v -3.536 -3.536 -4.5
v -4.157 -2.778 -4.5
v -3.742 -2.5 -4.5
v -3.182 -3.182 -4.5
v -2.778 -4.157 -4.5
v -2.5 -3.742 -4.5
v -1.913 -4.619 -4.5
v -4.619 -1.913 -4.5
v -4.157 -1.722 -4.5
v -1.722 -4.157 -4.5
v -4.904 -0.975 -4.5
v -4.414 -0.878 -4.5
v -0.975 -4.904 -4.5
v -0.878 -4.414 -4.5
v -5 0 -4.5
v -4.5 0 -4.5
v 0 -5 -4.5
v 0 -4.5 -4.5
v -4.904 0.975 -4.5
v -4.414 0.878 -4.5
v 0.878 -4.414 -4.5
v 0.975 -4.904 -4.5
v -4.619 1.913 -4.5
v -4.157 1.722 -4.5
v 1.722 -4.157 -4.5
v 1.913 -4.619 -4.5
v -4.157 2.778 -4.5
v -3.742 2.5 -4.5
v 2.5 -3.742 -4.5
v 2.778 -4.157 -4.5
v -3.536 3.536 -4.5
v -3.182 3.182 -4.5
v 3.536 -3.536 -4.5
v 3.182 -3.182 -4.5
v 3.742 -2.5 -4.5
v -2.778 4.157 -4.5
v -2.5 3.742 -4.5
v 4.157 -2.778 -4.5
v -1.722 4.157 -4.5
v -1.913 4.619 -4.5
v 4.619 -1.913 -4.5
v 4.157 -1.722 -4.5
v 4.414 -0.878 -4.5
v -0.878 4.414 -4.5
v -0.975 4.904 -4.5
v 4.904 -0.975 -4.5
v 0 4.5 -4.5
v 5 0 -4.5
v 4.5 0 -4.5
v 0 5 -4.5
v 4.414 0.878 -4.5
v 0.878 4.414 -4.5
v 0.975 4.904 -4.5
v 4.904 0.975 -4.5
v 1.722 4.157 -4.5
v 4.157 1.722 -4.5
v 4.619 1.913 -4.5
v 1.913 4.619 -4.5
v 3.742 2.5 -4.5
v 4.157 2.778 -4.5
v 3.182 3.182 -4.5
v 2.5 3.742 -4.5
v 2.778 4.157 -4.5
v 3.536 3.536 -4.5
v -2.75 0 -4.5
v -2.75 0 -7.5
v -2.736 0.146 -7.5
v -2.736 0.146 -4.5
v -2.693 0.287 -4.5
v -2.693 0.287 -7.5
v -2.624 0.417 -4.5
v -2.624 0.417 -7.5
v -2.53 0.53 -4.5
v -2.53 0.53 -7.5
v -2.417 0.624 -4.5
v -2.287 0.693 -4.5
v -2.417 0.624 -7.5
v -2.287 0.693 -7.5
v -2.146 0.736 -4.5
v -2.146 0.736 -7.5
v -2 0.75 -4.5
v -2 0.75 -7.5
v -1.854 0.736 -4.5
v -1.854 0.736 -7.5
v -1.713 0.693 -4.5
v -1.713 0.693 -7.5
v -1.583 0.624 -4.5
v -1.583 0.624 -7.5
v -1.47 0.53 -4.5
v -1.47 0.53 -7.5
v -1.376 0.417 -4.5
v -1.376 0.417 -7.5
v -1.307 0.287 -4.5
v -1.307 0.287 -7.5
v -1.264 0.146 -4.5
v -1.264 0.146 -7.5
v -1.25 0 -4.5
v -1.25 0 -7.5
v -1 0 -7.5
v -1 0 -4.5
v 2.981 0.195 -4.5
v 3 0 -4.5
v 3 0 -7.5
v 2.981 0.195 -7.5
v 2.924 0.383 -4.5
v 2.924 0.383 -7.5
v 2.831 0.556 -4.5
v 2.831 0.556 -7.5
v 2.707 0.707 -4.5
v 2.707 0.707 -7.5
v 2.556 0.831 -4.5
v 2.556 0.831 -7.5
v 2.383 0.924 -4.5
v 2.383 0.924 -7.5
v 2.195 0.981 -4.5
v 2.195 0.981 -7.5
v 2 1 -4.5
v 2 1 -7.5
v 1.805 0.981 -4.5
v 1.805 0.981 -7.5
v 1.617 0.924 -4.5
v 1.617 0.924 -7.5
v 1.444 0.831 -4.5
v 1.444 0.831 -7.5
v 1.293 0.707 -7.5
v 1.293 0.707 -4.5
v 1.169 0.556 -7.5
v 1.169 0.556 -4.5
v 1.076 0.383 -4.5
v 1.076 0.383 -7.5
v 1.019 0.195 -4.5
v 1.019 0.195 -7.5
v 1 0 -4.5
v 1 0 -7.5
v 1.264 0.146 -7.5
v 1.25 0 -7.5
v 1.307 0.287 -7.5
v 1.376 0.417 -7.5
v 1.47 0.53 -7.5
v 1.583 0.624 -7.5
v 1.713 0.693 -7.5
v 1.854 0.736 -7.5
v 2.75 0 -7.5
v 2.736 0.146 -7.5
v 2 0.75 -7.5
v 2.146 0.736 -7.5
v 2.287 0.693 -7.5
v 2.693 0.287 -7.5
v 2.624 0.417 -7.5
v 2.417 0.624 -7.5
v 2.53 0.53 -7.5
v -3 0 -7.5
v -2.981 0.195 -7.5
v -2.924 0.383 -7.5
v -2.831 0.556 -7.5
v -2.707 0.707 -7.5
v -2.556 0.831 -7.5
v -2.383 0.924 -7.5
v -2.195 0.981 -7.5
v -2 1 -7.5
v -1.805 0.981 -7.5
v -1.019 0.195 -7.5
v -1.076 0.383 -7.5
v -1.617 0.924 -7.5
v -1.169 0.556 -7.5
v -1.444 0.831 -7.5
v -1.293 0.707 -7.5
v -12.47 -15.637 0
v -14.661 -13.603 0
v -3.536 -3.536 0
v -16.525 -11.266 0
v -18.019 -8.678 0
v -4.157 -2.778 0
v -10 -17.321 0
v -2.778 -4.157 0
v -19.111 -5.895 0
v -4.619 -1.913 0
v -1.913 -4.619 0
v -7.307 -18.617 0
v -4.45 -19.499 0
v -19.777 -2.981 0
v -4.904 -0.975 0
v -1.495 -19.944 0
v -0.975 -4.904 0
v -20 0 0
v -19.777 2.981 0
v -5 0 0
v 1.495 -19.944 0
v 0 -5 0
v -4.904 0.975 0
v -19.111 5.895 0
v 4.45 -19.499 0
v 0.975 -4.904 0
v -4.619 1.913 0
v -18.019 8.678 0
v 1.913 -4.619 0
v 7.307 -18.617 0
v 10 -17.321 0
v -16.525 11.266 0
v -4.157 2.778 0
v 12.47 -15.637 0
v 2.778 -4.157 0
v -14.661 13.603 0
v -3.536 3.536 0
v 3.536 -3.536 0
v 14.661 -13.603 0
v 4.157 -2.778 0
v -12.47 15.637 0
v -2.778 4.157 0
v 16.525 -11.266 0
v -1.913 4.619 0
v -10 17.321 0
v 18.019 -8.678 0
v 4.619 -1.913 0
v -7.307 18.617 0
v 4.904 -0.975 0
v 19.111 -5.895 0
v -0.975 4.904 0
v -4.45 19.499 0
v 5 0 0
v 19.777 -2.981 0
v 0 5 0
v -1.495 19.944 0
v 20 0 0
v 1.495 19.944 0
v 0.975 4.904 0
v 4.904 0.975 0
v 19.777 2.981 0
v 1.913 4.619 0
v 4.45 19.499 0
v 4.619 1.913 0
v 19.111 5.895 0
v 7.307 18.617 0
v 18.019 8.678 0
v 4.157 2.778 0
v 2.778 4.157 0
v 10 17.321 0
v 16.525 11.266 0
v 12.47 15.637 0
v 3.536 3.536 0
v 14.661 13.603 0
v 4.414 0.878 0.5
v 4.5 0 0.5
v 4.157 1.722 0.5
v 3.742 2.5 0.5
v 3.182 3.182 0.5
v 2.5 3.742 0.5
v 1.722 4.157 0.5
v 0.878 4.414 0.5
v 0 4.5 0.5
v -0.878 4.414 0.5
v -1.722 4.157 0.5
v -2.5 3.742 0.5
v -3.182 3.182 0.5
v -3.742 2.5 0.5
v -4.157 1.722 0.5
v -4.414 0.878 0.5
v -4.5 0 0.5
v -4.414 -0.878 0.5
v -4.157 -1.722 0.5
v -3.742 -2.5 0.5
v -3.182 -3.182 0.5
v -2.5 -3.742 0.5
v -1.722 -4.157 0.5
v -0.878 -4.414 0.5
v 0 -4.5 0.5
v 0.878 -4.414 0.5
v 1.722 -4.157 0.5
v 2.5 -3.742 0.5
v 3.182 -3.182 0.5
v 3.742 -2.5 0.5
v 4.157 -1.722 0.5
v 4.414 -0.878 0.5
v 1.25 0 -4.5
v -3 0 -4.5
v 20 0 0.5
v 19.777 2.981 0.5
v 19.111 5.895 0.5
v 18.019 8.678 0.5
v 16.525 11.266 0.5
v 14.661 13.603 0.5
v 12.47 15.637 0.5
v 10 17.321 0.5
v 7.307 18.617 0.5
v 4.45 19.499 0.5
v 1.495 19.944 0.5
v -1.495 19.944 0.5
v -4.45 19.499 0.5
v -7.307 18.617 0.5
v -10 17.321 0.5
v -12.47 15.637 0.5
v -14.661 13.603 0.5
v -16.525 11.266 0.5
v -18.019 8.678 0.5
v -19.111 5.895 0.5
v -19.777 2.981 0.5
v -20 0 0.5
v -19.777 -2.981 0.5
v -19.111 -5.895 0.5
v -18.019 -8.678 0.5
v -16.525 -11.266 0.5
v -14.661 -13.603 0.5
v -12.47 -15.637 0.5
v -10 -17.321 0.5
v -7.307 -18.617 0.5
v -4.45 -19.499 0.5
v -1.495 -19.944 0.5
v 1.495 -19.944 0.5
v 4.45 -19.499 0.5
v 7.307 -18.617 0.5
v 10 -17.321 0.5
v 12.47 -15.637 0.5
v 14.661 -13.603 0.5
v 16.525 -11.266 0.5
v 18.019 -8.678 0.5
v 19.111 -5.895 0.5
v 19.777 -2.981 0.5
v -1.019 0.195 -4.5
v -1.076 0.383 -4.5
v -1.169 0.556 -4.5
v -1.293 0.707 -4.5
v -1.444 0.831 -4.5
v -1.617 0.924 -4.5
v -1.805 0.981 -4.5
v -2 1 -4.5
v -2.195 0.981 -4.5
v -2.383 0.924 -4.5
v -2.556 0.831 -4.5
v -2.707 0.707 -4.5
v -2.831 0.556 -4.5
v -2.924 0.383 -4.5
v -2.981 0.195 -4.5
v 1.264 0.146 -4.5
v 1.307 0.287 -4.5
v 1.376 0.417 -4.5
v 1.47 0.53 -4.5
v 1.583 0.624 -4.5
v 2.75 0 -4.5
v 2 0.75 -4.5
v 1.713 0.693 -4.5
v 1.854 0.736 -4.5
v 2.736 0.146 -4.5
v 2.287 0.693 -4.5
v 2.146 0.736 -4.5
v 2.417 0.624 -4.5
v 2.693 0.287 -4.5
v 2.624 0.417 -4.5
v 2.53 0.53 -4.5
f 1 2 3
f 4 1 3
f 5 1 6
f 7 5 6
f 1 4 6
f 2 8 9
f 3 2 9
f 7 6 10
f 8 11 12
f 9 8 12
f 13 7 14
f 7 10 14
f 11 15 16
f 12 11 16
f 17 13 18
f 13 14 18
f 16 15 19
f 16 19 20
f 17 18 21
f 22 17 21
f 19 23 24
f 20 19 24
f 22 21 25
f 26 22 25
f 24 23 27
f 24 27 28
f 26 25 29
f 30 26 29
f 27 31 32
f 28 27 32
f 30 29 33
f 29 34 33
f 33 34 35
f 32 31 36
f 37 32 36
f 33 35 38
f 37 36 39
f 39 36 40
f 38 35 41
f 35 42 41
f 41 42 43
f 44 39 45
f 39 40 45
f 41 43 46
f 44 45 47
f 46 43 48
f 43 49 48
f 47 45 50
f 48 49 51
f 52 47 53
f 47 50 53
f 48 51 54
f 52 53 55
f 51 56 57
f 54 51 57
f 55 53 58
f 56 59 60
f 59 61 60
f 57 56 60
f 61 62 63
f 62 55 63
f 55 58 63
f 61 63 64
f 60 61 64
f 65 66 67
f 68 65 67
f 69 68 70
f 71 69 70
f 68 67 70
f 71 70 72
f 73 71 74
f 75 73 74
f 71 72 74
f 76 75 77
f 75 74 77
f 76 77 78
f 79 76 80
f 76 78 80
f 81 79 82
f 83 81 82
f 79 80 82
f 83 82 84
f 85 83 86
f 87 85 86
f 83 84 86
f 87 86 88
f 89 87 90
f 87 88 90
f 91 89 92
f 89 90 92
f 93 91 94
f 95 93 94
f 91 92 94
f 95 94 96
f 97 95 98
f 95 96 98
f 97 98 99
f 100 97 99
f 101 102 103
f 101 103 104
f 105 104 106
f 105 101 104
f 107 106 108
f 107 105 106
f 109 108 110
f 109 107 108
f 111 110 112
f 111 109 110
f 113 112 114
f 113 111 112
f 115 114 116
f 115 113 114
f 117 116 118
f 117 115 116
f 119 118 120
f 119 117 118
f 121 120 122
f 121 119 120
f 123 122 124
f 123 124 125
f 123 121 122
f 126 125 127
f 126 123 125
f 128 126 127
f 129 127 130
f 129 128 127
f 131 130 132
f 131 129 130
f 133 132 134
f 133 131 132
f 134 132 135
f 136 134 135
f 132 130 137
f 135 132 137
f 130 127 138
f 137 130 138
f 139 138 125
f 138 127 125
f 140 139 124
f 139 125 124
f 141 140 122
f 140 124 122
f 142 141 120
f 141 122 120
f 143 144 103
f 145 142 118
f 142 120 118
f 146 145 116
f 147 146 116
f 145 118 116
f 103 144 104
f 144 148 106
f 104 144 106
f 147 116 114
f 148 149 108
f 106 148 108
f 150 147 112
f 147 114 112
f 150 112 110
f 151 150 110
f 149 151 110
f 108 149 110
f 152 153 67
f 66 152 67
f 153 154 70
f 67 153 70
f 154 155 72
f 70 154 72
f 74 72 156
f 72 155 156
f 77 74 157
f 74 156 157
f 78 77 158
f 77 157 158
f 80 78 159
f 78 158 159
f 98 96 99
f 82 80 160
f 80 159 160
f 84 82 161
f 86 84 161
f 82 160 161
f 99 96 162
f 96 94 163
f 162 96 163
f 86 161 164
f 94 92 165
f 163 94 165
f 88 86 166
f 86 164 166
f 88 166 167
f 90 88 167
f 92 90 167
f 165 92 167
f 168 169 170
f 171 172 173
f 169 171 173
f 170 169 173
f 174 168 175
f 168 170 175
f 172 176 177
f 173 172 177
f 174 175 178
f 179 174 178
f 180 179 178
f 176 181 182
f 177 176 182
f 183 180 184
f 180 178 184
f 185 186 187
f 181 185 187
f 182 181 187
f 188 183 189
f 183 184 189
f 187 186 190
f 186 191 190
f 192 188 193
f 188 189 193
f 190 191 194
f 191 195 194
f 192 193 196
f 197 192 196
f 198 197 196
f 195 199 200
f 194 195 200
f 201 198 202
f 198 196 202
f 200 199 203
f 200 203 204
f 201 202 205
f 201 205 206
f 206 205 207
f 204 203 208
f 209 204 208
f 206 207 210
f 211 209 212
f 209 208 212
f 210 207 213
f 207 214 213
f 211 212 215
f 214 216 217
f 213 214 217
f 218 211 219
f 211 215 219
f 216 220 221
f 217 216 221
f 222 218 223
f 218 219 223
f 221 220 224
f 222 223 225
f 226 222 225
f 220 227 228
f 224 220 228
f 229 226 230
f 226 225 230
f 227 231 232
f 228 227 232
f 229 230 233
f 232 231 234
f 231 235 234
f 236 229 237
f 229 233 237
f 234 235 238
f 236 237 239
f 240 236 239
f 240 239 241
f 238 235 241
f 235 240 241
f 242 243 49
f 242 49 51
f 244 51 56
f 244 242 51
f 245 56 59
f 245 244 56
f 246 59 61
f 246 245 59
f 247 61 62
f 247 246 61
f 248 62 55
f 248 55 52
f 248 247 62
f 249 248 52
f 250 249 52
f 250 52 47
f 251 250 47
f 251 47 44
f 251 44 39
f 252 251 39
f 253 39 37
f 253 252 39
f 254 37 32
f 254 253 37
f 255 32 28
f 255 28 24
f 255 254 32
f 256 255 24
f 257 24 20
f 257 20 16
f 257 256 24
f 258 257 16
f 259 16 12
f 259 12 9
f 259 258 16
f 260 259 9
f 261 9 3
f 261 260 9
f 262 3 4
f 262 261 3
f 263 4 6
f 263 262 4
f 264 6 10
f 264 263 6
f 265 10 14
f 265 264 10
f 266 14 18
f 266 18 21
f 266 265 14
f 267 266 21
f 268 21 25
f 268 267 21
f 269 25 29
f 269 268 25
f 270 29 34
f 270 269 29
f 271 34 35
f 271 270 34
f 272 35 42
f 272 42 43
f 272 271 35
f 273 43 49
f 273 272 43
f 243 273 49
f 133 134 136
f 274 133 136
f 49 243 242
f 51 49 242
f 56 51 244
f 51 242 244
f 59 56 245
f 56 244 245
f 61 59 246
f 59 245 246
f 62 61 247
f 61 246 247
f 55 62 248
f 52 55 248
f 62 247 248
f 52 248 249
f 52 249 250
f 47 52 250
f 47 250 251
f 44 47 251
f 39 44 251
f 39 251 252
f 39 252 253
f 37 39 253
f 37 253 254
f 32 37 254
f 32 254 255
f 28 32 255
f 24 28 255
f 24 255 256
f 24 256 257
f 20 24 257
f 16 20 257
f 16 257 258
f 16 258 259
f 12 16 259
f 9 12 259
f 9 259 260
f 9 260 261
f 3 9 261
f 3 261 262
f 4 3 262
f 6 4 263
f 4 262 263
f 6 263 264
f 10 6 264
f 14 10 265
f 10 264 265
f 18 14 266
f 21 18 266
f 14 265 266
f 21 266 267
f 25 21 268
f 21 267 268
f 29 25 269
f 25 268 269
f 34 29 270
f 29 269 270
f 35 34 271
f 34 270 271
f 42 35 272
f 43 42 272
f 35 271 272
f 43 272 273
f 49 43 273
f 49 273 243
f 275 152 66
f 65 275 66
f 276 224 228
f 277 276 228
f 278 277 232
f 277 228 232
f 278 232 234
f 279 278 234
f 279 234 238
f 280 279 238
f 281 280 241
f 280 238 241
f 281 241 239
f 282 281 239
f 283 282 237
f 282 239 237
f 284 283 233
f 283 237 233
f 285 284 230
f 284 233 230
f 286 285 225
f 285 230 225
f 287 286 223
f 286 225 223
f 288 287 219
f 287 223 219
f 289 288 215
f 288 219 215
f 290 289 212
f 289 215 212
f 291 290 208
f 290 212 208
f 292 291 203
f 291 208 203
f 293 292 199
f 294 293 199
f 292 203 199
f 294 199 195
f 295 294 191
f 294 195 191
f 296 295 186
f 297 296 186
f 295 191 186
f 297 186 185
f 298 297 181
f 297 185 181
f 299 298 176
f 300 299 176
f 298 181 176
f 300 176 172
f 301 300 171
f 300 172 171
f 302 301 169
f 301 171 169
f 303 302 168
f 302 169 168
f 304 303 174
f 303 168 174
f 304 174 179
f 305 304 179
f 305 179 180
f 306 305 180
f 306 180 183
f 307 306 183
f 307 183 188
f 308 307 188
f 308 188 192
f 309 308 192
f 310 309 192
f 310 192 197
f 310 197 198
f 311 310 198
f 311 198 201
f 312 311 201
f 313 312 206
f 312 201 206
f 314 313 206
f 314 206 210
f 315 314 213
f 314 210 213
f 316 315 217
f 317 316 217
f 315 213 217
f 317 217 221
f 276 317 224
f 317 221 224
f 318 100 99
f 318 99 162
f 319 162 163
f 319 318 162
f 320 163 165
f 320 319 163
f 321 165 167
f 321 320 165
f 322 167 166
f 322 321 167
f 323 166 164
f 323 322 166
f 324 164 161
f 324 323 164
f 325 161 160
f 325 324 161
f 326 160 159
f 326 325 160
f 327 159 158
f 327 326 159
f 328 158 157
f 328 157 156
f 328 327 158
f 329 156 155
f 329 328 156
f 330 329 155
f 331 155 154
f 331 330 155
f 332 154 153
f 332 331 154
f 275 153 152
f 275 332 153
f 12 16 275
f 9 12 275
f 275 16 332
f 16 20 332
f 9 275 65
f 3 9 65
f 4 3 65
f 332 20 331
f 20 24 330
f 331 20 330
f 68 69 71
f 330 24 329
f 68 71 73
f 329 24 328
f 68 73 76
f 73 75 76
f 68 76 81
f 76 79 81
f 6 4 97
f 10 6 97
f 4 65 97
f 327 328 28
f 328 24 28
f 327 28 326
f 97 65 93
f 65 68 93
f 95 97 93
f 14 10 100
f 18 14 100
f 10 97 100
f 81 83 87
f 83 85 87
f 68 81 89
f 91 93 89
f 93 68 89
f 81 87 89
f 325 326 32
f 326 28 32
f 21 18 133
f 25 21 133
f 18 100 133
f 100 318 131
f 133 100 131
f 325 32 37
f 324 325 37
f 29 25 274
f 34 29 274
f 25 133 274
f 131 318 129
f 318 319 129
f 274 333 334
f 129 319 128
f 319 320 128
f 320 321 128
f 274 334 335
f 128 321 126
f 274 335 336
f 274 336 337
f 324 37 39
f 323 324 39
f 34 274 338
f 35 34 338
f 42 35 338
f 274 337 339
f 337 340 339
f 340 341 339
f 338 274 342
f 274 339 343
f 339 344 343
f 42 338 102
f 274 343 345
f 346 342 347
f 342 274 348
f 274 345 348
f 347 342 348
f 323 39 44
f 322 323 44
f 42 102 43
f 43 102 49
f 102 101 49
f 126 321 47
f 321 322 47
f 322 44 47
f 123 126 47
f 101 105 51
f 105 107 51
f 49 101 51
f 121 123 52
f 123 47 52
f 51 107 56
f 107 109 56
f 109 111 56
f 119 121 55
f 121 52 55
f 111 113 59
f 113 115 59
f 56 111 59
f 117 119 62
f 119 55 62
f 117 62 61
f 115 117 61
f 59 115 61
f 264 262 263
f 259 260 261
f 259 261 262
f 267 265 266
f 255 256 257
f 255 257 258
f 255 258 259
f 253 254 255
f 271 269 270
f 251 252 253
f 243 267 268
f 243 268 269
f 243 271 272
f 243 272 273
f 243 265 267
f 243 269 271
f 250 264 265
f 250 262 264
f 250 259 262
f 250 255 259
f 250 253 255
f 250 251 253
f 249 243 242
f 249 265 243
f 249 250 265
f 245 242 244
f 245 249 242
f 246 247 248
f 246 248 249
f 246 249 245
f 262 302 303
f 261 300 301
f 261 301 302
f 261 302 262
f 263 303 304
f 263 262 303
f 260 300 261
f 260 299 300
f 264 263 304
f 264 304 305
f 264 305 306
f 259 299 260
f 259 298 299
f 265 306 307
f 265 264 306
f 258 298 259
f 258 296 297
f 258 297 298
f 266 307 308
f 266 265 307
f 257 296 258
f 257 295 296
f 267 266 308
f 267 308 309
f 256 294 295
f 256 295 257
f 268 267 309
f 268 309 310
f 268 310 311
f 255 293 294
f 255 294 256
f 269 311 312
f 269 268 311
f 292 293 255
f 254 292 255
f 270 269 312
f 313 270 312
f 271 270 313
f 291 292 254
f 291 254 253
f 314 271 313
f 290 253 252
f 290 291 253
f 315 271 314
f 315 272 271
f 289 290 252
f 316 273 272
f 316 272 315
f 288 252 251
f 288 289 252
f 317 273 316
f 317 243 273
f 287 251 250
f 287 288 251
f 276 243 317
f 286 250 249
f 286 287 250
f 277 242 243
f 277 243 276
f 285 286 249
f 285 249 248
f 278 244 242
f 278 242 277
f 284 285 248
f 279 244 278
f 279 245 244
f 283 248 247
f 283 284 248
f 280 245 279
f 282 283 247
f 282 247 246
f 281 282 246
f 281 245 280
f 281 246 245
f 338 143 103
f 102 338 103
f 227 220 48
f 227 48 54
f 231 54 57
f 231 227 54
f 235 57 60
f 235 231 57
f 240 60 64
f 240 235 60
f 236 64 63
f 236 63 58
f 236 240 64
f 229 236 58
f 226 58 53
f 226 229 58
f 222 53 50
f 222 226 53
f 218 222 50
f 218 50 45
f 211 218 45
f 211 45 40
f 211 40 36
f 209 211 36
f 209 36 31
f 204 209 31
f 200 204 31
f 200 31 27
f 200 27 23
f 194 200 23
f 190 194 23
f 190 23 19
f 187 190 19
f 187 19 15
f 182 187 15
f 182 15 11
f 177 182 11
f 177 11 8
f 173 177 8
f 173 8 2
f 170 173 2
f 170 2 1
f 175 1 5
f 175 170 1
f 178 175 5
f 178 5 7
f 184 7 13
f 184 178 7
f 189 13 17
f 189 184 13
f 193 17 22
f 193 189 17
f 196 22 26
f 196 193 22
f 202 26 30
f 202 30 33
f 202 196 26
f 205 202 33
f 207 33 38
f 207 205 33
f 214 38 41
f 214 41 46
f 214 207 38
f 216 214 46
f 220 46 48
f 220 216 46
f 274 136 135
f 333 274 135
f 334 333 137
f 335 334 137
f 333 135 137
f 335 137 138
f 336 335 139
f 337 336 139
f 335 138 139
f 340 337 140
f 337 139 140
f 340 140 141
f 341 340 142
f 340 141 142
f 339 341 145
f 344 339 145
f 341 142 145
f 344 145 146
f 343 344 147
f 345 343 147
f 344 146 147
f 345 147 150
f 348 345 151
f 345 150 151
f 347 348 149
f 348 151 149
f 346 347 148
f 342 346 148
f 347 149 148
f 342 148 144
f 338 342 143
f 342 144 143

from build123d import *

# Parameters (mm, degrees)
F0_R      = 20
F1_DEPTH  = 0.5
F2_R      = 5
F3_DEPTH  = 5
F4_R      = 4.5
F5_DEPTH  = 25
F6_R      = 4.5
F7_DEPTH  = 5
F8_R      = 1
F9_DEPTH  = 8
F11_DEPTH = 3


with BuildPart() as f1:
    # F0 (on Top) → F1 (new body)
    with BuildSketch(Plane.XY):
        Circle(F0_R)
    extrude(amount=F1_DEPTH)

    # F2 (on face) → F3 (join)
    with BuildSketch(Plane.XY.offset(0.5)):
        Circle(F2_R)
    extrude(amount=-F3_DEPTH)

    # F4 (on face) → F5 (cut)
    with BuildSketch(Plane.XY.offset(0.5)):
        Circle(F4_R)
    extrude(amount=-F5_DEPTH, mode=Mode.SUBTRACT)


with BuildPart() as f7:
    # F6 (on face) → F7 (new body)
    with BuildSketch(Plane.XY.offset(0.5)):
        Circle(F6_R)
    extrude(amount=-F7_DEPTH)

    # F8 (on face) → F9 (join)
    with BuildSketch(Plane.XY.offset(0.5)):
        with Locations((-2, 0)):
            Circle(F8_R)
        with Locations((2, 0)):
            Circle(F8_R)
    extrude(amount=-F9_DEPTH)

    # F10 (on face) → F11 (cut)
    with BuildSketch(Plane(origin=(0, 0, -7.5), x_dir=(1, 0, 0), z_dir=(0, 0, -1))):
        with BuildLine():
            Line((-1.25, 0), (-1, 0))
            ThreePointArc((-1, 0), (-2, 1), (-3, 0))
            Line((-3, 0), (-2.75, 0))
            ThreePointArc((-2.75, 0), (-2, -0.75), (-1.25, 0))
        make_face()
        with BuildLine():
            Line((2.75, 0), (3, 0))
            ThreePointArc((3, 0), (2, 1), (1, 0))
            Line((1, 0), (1.25, 0))
            ThreePointArc((1.25, 0), (2, -0.75), (2.75, 0))
        make_face()
    extrude(amount=-F11_DEPTH, mode=Mode.SUBTRACT)


solid = Compound([f1.part, f7.part])
